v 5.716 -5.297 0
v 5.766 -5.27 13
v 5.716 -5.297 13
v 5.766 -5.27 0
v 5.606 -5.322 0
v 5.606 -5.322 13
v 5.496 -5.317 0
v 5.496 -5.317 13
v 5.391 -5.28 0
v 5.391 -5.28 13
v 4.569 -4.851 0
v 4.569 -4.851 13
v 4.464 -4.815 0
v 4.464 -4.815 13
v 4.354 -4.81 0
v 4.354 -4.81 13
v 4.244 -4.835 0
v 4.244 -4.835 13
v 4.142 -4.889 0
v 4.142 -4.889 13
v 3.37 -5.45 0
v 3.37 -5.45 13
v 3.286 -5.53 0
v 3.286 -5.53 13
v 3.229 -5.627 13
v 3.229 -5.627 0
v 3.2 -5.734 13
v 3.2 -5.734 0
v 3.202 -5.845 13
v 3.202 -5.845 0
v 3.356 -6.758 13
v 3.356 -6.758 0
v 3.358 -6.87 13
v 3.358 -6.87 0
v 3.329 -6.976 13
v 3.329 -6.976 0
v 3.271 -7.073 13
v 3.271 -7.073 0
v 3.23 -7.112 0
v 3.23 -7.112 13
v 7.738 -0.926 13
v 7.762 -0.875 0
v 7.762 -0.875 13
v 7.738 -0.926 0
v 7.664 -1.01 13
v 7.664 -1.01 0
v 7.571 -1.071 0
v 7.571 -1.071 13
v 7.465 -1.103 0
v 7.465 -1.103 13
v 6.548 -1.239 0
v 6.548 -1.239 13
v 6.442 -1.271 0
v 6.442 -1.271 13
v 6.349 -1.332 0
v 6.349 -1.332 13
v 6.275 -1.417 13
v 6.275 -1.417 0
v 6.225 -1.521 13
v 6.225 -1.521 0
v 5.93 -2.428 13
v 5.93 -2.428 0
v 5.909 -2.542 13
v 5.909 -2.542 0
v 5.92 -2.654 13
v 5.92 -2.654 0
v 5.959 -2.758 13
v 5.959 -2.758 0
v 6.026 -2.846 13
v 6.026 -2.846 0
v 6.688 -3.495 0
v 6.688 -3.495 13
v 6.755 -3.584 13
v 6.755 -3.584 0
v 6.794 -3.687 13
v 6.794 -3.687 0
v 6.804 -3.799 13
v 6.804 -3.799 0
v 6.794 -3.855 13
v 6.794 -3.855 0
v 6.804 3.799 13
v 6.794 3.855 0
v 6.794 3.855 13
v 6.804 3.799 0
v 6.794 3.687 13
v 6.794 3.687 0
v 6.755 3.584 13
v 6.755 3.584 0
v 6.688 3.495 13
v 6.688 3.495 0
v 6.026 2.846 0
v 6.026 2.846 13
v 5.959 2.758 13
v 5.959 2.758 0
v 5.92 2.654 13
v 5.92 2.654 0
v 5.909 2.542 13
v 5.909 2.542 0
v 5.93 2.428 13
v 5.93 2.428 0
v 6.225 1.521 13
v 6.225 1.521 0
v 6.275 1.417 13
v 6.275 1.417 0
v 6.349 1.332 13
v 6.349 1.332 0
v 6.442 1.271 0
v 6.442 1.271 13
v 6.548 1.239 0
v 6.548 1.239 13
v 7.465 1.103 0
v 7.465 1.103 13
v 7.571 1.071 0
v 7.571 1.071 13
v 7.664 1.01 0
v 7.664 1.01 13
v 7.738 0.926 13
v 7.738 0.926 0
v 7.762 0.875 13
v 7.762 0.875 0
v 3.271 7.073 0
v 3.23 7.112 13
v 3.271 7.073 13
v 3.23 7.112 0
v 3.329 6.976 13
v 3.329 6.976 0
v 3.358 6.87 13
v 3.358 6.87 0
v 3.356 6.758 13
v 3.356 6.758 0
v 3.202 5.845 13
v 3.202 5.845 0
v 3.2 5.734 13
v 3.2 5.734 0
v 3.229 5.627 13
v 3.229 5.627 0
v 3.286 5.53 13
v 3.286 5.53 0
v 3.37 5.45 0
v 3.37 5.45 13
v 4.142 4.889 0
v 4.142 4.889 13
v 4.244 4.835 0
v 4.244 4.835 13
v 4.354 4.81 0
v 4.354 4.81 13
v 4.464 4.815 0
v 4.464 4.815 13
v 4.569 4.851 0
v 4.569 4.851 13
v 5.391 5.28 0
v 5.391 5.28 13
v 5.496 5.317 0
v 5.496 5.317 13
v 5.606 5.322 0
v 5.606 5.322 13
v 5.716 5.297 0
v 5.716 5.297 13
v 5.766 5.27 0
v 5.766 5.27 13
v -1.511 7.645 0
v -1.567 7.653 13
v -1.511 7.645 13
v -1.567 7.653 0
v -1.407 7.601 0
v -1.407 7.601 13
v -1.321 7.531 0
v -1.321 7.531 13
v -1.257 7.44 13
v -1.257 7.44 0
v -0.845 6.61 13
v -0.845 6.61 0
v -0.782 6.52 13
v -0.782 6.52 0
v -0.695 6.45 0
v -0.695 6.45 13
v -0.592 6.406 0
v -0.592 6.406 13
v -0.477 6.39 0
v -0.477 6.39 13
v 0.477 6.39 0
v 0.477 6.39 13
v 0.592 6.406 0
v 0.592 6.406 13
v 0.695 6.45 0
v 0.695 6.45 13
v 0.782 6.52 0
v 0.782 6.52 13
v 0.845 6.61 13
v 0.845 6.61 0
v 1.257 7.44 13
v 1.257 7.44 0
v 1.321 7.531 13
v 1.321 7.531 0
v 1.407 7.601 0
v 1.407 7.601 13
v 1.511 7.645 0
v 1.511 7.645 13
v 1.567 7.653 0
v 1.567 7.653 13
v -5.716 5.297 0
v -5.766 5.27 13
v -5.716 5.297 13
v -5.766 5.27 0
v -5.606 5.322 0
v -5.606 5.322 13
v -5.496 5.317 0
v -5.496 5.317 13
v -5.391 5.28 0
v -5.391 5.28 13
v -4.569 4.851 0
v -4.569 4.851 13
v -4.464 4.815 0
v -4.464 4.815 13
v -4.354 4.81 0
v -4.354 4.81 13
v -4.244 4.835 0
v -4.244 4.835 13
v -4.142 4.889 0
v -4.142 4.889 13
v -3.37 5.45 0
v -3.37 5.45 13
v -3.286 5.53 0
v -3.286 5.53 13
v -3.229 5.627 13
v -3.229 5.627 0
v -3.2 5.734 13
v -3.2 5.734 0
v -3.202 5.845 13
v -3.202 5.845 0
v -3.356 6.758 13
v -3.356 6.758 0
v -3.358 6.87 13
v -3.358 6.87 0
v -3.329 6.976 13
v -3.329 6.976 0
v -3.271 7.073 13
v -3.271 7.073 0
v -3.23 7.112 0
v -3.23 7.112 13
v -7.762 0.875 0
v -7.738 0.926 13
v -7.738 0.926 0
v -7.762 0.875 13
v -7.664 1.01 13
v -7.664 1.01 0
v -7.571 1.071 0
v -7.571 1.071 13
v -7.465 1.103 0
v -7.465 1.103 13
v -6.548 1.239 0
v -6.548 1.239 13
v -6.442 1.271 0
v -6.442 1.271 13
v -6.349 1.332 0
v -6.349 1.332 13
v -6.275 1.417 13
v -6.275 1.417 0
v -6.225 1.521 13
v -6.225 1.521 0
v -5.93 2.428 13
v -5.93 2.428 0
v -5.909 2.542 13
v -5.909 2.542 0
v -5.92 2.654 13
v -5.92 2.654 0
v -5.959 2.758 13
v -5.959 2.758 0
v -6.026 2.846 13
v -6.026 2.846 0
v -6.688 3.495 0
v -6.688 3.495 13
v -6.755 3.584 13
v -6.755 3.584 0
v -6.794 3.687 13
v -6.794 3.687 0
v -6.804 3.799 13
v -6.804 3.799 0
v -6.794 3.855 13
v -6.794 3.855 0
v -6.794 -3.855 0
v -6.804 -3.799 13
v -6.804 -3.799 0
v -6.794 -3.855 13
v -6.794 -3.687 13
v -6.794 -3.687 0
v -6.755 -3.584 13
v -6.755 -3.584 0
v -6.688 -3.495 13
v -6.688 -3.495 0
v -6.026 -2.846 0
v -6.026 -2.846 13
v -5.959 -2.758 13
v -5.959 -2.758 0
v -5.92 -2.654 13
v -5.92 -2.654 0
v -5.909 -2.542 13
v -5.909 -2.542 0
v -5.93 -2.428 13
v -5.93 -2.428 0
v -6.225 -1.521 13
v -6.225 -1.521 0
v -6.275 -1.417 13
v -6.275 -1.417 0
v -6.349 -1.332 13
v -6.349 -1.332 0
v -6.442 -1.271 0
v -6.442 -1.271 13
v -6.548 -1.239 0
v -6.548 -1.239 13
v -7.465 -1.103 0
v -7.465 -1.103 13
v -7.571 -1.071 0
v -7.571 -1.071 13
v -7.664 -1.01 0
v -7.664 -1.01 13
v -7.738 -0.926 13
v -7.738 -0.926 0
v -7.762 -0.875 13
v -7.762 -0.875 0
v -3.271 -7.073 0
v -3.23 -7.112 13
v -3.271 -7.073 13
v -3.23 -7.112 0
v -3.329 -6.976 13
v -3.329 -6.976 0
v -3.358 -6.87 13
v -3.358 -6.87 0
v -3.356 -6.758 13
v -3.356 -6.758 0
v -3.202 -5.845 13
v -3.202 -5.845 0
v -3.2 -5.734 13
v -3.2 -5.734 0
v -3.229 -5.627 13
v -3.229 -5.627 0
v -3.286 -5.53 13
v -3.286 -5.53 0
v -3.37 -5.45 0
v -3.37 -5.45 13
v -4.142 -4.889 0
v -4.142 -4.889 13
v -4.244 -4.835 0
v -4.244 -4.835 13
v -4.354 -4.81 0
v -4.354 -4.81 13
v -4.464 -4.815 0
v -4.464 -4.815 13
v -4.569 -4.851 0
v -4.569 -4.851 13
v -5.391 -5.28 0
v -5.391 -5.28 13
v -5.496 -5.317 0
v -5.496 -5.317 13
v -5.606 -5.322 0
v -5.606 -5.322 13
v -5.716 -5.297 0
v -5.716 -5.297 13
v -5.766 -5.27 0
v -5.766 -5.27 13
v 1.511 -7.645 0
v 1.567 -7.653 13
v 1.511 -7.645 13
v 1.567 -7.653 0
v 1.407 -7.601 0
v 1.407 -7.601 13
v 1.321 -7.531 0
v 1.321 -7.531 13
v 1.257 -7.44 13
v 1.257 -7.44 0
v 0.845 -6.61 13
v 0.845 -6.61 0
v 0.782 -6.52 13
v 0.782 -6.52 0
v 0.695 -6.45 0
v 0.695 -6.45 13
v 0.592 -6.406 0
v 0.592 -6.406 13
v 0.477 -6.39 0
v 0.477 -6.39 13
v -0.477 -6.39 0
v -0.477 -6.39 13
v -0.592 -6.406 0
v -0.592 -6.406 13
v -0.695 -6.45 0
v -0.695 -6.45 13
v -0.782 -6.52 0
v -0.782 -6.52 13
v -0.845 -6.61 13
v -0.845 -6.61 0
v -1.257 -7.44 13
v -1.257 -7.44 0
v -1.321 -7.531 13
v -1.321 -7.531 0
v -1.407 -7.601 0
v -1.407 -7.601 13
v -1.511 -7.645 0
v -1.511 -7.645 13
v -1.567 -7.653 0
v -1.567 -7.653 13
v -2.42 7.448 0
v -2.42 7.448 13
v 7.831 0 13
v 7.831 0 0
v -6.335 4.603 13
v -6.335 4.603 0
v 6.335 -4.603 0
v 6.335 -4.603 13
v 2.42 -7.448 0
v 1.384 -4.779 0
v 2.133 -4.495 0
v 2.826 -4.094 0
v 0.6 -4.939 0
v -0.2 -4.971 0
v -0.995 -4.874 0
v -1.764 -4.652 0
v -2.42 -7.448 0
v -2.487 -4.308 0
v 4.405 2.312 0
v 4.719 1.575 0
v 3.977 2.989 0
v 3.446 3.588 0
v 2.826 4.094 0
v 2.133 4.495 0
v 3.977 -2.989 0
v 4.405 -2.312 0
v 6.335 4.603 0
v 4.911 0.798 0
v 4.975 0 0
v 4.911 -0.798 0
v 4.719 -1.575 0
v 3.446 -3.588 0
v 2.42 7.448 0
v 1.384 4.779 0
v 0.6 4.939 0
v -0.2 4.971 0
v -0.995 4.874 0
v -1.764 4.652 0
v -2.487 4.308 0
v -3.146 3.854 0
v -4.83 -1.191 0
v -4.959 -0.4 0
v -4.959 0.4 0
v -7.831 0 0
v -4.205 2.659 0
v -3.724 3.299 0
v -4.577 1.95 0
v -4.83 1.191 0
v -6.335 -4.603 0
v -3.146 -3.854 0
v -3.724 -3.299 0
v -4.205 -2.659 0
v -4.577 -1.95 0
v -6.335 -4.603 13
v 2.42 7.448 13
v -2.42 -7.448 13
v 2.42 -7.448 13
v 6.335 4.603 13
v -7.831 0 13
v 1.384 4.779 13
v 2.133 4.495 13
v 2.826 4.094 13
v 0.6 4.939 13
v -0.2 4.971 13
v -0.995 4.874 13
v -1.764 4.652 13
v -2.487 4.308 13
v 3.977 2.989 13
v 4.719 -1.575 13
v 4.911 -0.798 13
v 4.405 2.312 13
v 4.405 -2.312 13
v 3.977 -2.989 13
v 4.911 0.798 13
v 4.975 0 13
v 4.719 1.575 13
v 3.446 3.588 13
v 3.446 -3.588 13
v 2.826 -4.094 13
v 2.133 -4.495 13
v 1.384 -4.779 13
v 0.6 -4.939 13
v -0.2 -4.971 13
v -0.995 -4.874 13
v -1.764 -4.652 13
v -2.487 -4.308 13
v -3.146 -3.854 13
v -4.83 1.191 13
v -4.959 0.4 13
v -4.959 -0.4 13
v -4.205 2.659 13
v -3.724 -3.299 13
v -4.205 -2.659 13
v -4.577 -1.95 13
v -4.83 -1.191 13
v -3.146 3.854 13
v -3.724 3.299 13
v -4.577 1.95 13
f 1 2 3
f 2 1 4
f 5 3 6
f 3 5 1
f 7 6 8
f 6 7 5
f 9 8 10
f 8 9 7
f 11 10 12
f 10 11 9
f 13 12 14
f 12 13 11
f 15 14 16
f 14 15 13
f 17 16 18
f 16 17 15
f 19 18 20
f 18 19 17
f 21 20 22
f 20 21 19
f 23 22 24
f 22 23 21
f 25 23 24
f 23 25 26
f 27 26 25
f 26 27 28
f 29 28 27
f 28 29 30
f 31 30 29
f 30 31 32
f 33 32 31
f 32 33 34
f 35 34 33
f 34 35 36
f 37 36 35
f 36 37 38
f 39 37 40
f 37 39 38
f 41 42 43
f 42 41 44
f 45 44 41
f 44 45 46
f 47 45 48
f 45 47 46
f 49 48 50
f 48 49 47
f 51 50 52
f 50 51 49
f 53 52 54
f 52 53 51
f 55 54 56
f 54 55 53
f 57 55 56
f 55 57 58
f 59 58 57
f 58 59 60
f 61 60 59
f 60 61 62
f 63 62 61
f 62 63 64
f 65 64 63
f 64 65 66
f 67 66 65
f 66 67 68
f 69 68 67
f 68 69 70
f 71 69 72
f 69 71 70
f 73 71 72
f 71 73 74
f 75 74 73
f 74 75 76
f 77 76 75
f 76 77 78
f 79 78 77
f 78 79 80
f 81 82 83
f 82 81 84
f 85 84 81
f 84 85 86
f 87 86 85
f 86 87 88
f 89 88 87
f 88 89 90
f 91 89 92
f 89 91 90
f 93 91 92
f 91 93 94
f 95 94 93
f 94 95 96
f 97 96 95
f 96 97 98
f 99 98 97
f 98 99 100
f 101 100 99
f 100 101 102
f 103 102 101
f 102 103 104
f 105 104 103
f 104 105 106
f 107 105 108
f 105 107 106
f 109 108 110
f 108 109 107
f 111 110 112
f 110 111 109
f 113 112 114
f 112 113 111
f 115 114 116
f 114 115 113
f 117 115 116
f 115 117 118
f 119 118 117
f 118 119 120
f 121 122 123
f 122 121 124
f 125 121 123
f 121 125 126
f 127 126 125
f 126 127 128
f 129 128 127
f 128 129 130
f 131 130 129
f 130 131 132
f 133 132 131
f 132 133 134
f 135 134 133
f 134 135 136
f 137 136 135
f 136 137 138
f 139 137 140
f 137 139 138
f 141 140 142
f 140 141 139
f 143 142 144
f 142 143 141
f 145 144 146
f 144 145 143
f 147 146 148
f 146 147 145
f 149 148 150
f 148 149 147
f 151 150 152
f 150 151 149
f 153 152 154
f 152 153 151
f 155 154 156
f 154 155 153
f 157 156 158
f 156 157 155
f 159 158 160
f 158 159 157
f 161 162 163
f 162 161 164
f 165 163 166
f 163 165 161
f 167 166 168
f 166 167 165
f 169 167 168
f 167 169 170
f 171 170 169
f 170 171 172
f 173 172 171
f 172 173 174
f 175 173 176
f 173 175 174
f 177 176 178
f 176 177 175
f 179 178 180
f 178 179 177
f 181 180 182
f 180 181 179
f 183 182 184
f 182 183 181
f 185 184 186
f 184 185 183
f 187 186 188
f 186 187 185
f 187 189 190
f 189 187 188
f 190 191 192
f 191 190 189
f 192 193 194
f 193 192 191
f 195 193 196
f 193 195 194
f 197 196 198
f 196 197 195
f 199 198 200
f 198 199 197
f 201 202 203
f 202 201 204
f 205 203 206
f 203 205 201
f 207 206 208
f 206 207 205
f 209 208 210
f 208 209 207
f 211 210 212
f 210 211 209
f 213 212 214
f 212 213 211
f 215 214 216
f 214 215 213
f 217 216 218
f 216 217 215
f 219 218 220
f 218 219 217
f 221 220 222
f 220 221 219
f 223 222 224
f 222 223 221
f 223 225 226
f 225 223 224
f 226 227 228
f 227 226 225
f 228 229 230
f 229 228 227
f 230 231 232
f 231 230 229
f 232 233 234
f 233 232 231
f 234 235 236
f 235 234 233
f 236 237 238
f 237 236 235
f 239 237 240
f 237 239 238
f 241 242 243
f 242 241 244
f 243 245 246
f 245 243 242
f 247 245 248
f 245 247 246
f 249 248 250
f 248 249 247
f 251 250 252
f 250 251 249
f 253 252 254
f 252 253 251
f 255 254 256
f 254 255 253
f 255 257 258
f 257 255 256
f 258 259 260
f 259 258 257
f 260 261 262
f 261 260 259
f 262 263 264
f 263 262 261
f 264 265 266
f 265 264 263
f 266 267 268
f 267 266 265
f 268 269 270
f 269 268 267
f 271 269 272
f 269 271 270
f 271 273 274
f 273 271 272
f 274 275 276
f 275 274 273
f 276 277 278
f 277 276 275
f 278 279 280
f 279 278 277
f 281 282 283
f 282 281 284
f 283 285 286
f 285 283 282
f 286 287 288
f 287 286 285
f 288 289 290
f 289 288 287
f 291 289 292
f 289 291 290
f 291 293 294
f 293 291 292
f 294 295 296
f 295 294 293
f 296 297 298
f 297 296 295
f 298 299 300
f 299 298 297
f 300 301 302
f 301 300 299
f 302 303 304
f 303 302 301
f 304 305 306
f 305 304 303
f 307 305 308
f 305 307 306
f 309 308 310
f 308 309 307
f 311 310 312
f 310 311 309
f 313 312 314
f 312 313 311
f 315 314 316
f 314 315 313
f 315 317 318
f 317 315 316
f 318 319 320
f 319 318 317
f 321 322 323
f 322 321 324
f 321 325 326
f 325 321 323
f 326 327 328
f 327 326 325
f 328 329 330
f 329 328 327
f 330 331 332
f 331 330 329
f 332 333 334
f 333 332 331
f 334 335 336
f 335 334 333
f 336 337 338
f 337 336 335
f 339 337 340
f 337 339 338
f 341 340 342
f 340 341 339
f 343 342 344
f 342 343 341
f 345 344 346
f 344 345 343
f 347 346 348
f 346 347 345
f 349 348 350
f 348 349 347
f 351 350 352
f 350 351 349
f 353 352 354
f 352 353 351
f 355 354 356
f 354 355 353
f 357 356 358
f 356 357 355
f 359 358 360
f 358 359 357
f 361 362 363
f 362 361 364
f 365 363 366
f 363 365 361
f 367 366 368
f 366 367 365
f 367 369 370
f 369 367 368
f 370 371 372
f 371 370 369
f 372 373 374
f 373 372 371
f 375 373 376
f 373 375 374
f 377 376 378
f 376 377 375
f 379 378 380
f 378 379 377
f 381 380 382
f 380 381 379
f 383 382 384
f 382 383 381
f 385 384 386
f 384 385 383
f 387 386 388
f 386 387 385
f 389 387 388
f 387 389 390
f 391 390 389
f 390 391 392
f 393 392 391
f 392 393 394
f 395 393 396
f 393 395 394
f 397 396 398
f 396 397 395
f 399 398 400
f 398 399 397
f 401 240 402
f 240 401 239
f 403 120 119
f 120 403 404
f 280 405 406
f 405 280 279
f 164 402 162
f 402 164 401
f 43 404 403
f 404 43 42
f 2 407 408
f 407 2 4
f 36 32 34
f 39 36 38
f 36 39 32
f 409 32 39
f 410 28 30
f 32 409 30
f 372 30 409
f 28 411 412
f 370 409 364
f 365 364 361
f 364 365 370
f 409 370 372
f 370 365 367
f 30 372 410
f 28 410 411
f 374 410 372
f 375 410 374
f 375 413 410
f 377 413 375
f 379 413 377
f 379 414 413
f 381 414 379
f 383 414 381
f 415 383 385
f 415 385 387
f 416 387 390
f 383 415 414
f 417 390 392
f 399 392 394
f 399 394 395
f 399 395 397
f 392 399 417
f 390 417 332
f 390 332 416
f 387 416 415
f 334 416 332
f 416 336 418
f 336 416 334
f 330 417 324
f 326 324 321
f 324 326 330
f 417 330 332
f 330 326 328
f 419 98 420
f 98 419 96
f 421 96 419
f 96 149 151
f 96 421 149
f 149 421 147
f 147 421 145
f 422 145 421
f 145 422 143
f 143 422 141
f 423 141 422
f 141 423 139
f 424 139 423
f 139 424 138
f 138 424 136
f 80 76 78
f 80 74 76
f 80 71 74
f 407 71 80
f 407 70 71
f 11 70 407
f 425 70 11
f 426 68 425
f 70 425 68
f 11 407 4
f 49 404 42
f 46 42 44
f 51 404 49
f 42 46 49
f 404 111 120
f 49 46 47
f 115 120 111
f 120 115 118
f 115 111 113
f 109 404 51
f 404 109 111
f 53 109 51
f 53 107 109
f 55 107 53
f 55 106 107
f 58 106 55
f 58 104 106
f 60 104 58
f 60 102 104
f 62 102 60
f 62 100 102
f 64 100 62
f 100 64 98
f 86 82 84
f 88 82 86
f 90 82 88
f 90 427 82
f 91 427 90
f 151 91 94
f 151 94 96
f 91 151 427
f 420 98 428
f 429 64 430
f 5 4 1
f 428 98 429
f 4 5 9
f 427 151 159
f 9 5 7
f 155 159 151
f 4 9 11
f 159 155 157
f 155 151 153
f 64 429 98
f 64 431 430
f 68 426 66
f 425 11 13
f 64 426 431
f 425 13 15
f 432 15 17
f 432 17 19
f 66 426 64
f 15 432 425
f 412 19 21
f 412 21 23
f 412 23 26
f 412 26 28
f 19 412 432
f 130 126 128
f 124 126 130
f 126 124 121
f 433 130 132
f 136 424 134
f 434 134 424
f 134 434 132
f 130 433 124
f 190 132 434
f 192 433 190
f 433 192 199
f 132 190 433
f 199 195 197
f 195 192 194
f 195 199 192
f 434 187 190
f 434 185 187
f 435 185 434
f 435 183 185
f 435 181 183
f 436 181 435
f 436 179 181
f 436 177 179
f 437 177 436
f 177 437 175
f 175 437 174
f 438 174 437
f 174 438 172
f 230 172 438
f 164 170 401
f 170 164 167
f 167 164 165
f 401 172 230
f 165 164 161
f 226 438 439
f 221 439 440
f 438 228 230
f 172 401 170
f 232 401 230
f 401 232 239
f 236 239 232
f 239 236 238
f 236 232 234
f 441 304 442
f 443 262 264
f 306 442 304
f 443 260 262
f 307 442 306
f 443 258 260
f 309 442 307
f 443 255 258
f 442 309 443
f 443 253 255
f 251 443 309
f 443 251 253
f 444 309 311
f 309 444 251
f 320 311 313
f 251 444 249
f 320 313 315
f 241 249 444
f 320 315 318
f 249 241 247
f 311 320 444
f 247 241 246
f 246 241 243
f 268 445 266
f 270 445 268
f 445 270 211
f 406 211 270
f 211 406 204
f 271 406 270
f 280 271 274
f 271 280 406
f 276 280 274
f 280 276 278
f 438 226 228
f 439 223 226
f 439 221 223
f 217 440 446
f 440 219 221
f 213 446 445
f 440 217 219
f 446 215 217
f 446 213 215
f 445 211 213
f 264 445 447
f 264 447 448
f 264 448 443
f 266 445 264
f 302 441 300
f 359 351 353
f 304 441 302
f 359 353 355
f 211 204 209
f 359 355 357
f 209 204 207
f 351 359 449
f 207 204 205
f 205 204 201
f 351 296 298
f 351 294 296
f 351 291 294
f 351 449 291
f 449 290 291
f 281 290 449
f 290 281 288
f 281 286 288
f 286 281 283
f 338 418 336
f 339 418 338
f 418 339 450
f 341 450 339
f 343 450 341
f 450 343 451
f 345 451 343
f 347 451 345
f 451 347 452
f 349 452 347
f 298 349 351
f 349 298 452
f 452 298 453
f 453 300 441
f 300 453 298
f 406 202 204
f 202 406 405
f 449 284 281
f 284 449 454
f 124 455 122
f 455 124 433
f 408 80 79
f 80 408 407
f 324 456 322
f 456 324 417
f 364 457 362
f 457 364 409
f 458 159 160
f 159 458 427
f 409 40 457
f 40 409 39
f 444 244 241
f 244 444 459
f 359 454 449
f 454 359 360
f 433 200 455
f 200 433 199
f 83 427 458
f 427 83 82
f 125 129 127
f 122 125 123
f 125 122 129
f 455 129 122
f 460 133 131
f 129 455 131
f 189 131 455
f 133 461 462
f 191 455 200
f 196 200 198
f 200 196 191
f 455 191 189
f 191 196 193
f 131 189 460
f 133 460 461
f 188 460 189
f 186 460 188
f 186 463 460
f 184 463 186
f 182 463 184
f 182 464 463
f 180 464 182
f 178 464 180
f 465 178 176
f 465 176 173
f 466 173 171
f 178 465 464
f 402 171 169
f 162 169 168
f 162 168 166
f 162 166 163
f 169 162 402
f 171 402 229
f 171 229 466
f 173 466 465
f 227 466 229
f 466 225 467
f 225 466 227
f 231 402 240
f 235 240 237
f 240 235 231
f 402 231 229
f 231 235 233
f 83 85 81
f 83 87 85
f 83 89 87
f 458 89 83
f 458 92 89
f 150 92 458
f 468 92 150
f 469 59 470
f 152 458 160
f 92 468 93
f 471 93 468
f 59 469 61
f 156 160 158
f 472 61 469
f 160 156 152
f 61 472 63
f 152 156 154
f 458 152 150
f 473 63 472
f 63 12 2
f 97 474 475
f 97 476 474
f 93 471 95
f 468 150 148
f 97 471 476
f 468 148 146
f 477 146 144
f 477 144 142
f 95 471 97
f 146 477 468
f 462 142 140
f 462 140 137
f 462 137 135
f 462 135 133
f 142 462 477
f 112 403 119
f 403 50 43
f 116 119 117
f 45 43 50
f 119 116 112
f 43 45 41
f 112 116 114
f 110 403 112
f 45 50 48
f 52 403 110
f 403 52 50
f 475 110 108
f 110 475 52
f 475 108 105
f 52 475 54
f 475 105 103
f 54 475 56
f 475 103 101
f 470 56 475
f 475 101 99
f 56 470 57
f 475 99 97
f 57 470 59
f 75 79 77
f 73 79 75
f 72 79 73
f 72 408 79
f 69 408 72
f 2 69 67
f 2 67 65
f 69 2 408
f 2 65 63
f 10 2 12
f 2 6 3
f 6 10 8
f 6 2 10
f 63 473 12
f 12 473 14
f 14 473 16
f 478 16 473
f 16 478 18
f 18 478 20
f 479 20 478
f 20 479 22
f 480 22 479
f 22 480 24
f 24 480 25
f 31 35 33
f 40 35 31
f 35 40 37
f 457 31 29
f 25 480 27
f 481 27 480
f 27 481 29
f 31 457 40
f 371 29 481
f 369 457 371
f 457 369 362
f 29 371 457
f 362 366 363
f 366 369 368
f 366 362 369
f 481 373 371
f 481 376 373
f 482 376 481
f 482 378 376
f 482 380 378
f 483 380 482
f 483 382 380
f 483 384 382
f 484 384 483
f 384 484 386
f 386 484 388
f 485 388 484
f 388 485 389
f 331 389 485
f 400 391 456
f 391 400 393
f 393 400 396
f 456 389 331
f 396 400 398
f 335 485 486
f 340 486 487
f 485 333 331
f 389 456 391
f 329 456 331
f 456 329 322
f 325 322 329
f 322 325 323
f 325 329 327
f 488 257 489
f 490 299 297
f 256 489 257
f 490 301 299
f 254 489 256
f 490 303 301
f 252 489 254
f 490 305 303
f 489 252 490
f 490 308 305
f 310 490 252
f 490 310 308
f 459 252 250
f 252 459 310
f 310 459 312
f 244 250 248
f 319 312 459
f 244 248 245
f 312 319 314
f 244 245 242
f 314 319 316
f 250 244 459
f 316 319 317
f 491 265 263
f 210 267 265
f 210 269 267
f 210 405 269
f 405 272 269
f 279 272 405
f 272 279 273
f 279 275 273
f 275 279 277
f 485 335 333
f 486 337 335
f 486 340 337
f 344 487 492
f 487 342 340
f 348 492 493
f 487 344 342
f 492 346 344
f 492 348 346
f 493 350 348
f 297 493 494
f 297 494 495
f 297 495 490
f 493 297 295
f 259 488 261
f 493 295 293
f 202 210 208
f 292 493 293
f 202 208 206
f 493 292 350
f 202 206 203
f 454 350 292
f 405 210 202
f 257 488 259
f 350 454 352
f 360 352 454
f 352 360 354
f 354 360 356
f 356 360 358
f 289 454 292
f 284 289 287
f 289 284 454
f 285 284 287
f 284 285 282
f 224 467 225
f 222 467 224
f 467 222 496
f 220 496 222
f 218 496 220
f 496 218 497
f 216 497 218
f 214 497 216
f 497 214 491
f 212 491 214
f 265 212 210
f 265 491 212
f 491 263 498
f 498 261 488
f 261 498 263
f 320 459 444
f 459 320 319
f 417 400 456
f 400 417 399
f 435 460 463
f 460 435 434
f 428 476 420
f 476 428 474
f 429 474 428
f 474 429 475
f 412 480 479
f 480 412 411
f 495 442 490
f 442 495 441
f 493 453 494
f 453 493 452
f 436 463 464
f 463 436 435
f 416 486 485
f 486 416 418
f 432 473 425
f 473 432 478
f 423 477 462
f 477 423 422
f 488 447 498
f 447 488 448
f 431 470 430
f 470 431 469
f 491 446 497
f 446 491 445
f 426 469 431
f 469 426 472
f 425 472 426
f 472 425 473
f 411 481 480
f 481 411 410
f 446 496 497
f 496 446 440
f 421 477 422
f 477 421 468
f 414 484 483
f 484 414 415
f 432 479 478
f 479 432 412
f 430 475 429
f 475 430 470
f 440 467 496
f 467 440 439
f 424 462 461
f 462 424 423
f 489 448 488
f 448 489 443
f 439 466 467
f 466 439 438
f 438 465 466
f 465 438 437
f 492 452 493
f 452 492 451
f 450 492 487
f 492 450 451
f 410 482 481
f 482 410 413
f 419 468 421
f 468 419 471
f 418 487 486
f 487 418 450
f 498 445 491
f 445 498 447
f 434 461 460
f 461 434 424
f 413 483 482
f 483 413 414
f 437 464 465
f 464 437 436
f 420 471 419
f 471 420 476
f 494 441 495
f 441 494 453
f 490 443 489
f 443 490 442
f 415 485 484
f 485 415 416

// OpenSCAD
// Parametric Pulley with multiple belt profiles
// by droftarts January 2012

// Based on pulleys by:
// http://www.thingiverse.com/thing:11256 by me!
// https://github.com/prusajr/PrusaMendel by Josef Prusa
// http://www.thingiverse.com/thing:3104 by GilesBathgate
// http://www.thingiverse.com/thing:2079 by nophead

// dxf tooth data from http://oem.cadregister.com/asp/PPOW_Entry.asp?company=915217&elementID=07807803/METRIC/URETH/WV0025/F
// pulley diameter checked and modelled from data at http://www.sdp-si.com/D265/HTML/D265T016.html

/**
 * @name Pulley
 * @category Printed
 * @using 1 x m3 nut, normal or nyloc
 * @using 1 x m3x10 set screw or 1 x m3x8 grub screw
 */


// tuneable constants

teeth = 10;			// Number of teeth, standard Mendel T5 belt = 8, gives Outside Diameter of 11.88mm
profile = 3;		// 1=MXL 2=40DP 3=XL 4=H 5=T2.5 6=T5 7=T10 8=AT5 9=HTD_3mm 10=HTD_5mm 11=HTD_8mm 12=GT2_2mm 13=GT2_3mm 14=GT2_5mm

motor_shaft = 9.95;	// NEMA17 motor shaft exact diameter = 5
m3_dia = 3.2;		// 3mm hole diameter
m3_nut_hex = 1;		// 1 for hex, 0 for square nut
m3_nut_flats = 5.7;	// normal M3 hex nut exact width = 5.5
m3_nut_depth = 2.7;	// normal M3 hex nut exact depth = 2.4, nyloc = 4

retainer = 0;		// Belt retainer above teeth, 0 = No, 1 = Yes
retainer_ht = 0;	// height of retainer flange over pulley, standard = 1.5
idler = 0;			// Belt retainer below teeth, 0 = No, 1 = Yes
idler_ht = 0;		// height of idler flange over pulley, standard = 1.5

pulley_t_ht = 13;	// length of toothed part of pulley, standard = 12
pulley_b_ht = 0;		// pulley base height, standard = 8. Set to same as idler_ht if you want an idler but no pulley.
pulley_b_dia = 20;	// pulley base diameter, standard = 20
no_of_nuts = 1;		// number of captive nuts required, standard = 1
nut_angle = 90;		// angle between nuts, standard = 90
nut_shaft_distance = 1.2;	// distance between inner face of nut and shaft, can be negative.


//	********************************
//	** Scaling tooth for good fit **
//	********************************
/*	To improve fit of belt to pulley, set the following constant. Decrease or increase by 0.1mm at a time. We are modelling the *BELT* tooth here, not the tooth on the pulley. Increasing the number will *decrease* the pulley tooth size. Increasing the tooth width will also scale proportionately the tooth depth, to maintain the shape of the tooth, and increase how far into the pulley the tooth is indented. Can be negative */

additional_tooth_width = 0.2; //mm

//	If you need more tooth depth than this provides, adjust the following constant. However, this will cause the shape of the tooth to change.

additional_tooth_depth = 0; //mm

// calculated constants

nut_elevation = pulley_b_ht/2;
m3_nut_points = 2*((m3_nut_flats/2)/cos(30)); // This is needed for the nut trap

// The following set the pulley diameter for a given number of teeth

MXL_pulley_dia = tooth_spacing (2.032,0.254);
40DP_pulley_dia = tooth_spacing (2.07264,0.1778);
XL_pulley_dia = tooth_spacing (5.08,0.254);
H_pulley_dia = tooth_spacing (9.525,0.381);
T2_5_pulley_dia = tooth_spaceing_curvefit (0.7467,0.796,1.026);
T5_pulley_dia = tooth_spaceing_curvefit (0.6523,1.591,1.064);
T10_pulley_dia = tooth_spacing (10,0.93);
AT5_pulley_dia = tooth_spaceing_curvefit (0.6523,1.591,1.064);
HTD_3mm_pulley_dia = tooth_spacing (3,0.381);
HTD_5mm_pulley_dia = tooth_spacing (5,0.5715);
HTD_8mm_pulley_dia = tooth_spacing (8,0.6858);
GT2_2mm_pulley_dia = tooth_spacing (2,0.254);
GT2_3mm_pulley_dia = tooth_spacing (3,0.381);
GT2_5mm_pulley_dia = tooth_spacing (5,0.5715);

// The following calls the pulley creation part, and passes the pulley diameter and tooth width to that module

if ( profile == 1 ) { pulley ( "MXL" , MXL_pulley_dia , 0.508 , 1.321 ); }
if ( profile == 2 ) { pulley ( "40 D.P." , 40DP_pulley_dia , 0.457 , 1.226 ); }
if ( profile == 3 ) { pulley ( "XL" , XL_pulley_dia , 1.27, 3.051 ); }
if ( profile == 4 ) { pulley ( "H" , H_pulley_dia ,1.905 , 5.359 ); }
if ( profile == 5 ) { pulley ( "T2.5" , T2_5_pulley_dia , 0.7 , 1.678 ); }
if ( profile == 6 ) { pulley ( "T5" , T5_pulley_dia , 1.19 , 3.264 ); }
if ( profile == 7 ) { pulley ( "T10" , T10_pulley_dia , 2.5 , 6.13 ); }
if ( profile == 8 ) { pulley ( "AT5" , AT5_pulley_dia , 1.19 , 4.268 ); }
if ( profile == 9 ) { pulley ( "HTD 3mm" , HTD_3mm_pulley_dia , 1.289 , 2.27 ); }
if ( profile == 10 ) { pulley ( "HTD 5mm" , HTD_5mm_pulley_dia , 2.199 , 3.781 ); }
if ( profile == 11 ) { pulley ( "HTD 8mm" , HTD_8mm_pulley_dia , 3.607 , 6.603 ); }
if ( profile == 12 ) { pulley ( "GT2 2mm" , GT2_2mm_pulley_dia , 0.764 , 1.494 ); }
if ( profile == 13 ) { pulley ( "GT2 3mm" , GT2_3mm_pulley_dia , 1.169 , 2.31 ); }
if ( profile == 14 ) { pulley ( "GT2 5mm" , GT2_5mm_pulley_dia , 1.969 , 3.952 ); }

// Functions

function tooth_spaceing_curvefit (b,c,d)
	= ((c * pow(teeth,d)) / (b + pow(teeth,d))) * teeth ;

function tooth_spacing(tooth_pitch,pitch_line_offset)
	= (2*((teeth*tooth_pitch)/(3.14159265*2)-pitch_line_offset)) ;

// Main Module

module pulley( belt_type , pulley_OD , tooth_depth , tooth_width )
	{
	echo (str("Belt type = ",belt_type,"; Number of teeth = ",teeth,"; Pulley Outside Diameter = ",pulley_OD,"mm "));
	tooth_distance_from_centre = sqrt( pow(pulley_OD/2,2) - pow((tooth_width+additional_tooth_width)/2,2));
	tooth_width_scale = (tooth_width + additional_tooth_width ) / tooth_width;
	tooth_depth_scale = ((tooth_depth + additional_tooth_depth ) / tooth_depth) ;


//	************************************************************************
//	*** uncomment the following line if pulley is wider than puller base ***
//	************************************************************************

//	translate ([0,0, pulley_b_ht + pulley_t_ht + retainer_ht ]) rotate ([0,180,0])

	difference()
	 {	 
		union()
		{
			//base
	
			if ( pulley_b_ht < 2 ) { echo ("CAN'T DRAW PULLEY BASE, HEIGHT LESS THAN 2!!!"); } else {
				rotate_extrude($fn=pulley_b_dia*2)
				{
						square([pulley_b_dia/2-1,pulley_b_ht]);
						square([pulley_b_dia/2,pulley_b_ht-1]);
						translate([pulley_b_dia/2-1,pulley_b_ht-1]) circle(1);
				}
			}
	
		difference()
			{
			//shaft - diameter is outside diameter of pulley
			
			translate([0,0,pulley_b_ht]) 
			rotate ([0,0,360/(teeth*4)]) 
			cylinder(r=pulley_OD/2,h=pulley_t_ht, $fn=teeth*4);
	
			//teeth - cut out of shaft
		
			for(i=[1:teeth]) 
			rotate([0,0,i*(360/teeth)])
			translate([0,-tooth_distance_from_centre,pulley_b_ht -1]) 
			scale ([ tooth_width_scale , tooth_depth_scale , 1 ]) 
			{
			if ( profile == 1 ) { MXL();}
			if ( profile == 2 ) { 40DP();}
			if ( profile == 3 ) { XL();}
			if ( profile == 4 ) { H();}
			if ( profile == 5 ) { T2_5();}
			if ( profile == 6 ) { T5();}
			if ( profile == 7 ) { T10();}
			if ( profile == 8 ) { AT5();}
			if ( profile == 9 ) { HTD_3mm();}
			if ( profile == 10 ) { HTD_5mm();}
			if ( profile == 11 ) { HTD_8mm();}
			if ( profile == 12 ) { GT2_2mm();}
			if ( profile == 13 ) { GT2_3mm();}
			if ( profile == 14 ) { GT2_5mm();}
			}

			}
			
		//belt retainer / idler
		if ( retainer > 0 ) {translate ([0,0, pulley_b_ht + pulley_t_ht ]) 
		rotate_extrude($fn=teeth*4)  
		polygon([[0,0],[pulley_OD/2,0],[pulley_OD/2 + retainer_ht , retainer_ht],[0 , retainer_ht],[0,0]]);}
		
		if ( idler > 0 ) {translate ([0,0, pulley_b_ht - idler_ht ]) 
		rotate_extrude($fn=teeth*4)  
		polygon([[0,0],[pulley_OD/2 + idler_ht,0],[pulley_OD/2 , idler_ht],[0 , idler_ht],[0,0]]);}
	
		}
	   
		//hole for motor shaft
		translate([0,0,-1])cylinder(r=motor_shaft/2,h=pulley_b_ht + pulley_t_ht + retainer_ht + 2,$fn=motor_shaft*4);
				
		//captive nut and grub screw holes
	
		if ( pulley_b_ht < m3_nut_flats ) { echo ("CAN'T DRAW CAPTIVE NUTS, HEIGHT LESS THAN NUT DIAMETER!!!"); } else {
		if ( (pulley_b_dia - motor_shaft)/2 < m3_nut_depth + 3 ) { echo ("CAN'T DRAW CAPTIVE NUTS, DIAMETER TOO SMALL FOR NUT DEPTH!!!"); } else {
	
			for(j=[1:no_of_nuts]) rotate([0,0,j*nut_angle])
			translate([0,0,nut_elevation])rotate([90,0,0])
	
			union()
			{
				//entrance
				translate([0,-pulley_b_ht/4-0.5,motor_shaft/2+m3_nut_depth/2+nut_shaft_distance]) cube([m3_nut_flats,pulley_b_ht/2+1,m3_nut_depth],center=true);
	
				//nut
				if ( m3_nut_hex > 0 )
					{
						// hex nut
						translate([0,0.25,motor_shaft/2+m3_nut_depth/2+nut_shaft_distance]) rotate([0,0,30]) cylinder(r=m3_nut_points/2,h=m3_nut_depth,center=true,$fn=6);
					} else {
						// square nut
						translate([0,0.25,motor_shaft/2+m3_nut_depth/2+nut_shaft_distance]) cube([m3_nut_flats,m3_nut_flats,m3_nut_depth],center=true);
					}
	
				//grub screw hole
				rotate([0,0,22.5])cylinder(r=m3_dia/2,h=pulley_b_dia/2+1,$fn=8);
			}
		}}
	 }
	   
	}


// Tooth profile modules

module MXL()
	{
	linear_extrude(height=pulley_t_ht+2) polygon([[-0.660421,-0.5],[-0.660421,0],[-0.621898,0.006033],[-0.587714,0.023037],[-0.560056,0.049424],[-0.541182,0.083609],[-0.417357,0.424392],[-0.398413,0.458752],[-0.370649,0.48514],[-0.336324,0.502074],[-0.297744,0.508035],[0.297744,0.508035],[0.336268,0.502074],[0.370452,0.48514],[0.39811,0.458752],[0.416983,0.424392],[0.540808,0.083609],[0.559752,0.049424],[0.587516,0.023037],[0.621841,0.006033],[0.660421,0],[0.660421,-0.5]]);
	}

module 40DP()
	{
	linear_extrude(height=pulley_t_ht+2) polygon([[-0.612775,-0.5],[-0.612775,0],[-0.574719,0.010187],[-0.546453,0.0381],[-0.355953,0.3683],[-0.327604,0.405408],[-0.291086,0.433388],[-0.248548,0.451049],[-0.202142,0.4572],[0.202494,0.4572],[0.248653,0.451049],[0.291042,0.433388],[0.327609,0.405408],[0.356306,0.3683],[0.546806,0.0381],[0.574499,0.010187],[0.612775,0],[0.612775,-0.5]]);
	}

module XL()
	{
	linear_extrude(height=pulley_t_ht+2) polygon([[-1.525411,-1],[-1.525411,0],[-1.41777,0.015495],[-1.320712,0.059664],[-1.239661,0.129034],[-1.180042,0.220133],[-0.793044,1.050219],[-0.733574,1.141021],[-0.652507,1.210425],[-0.555366,1.254759],[-0.447675,1.270353],[0.447675,1.270353],[0.555366,1.254759],[0.652507,1.210425],[0.733574,1.141021],[0.793044,1.050219],[1.180042,0.220133],[1.239711,0.129034],[1.320844,0.059664],[1.417919,0.015495],[1.525411,0],[1.525411,-1]]);
	}

module H()
	{
	linear_extrude(height=pulley_t_ht+2) polygon([[-2.6797,-1],[-2.6797,0],[-2.600907,0.006138],[-2.525342,0.024024],[-2.45412,0.052881],[-2.388351,0.091909],[-2.329145,0.140328],[-2.277614,0.197358],[-2.234875,0.262205],[-2.202032,0.334091],[-1.75224,1.57093],[-1.719538,1.642815],[-1.676883,1.707663],[-1.62542,1.764693],[-1.566256,1.813112],[-1.500512,1.85214],[-1.4293,1.880997],[-1.353742,1.898883],[-1.274949,1.905021],[1.275281,1.905021],[1.354056,1.898883],[1.429576,1.880997],[1.500731,1.85214],[1.566411,1.813112],[1.625508,1.764693],[1.676919,1.707663],[1.719531,1.642815],[1.752233,1.57093],[2.20273,0.334091],[2.235433,0.262205],[2.278045,0.197358],[2.329455,0.140328],[2.388553,0.091909],[2.454233,0.052881],[2.525384,0.024024],[2.600904,0.006138],[2.6797,0],[2.6797,-1]]);
	}

module T2_5()
	{
	linear_extrude(height=pulley_t_ht+2) polygon([[-0.839258,-0.5],[-0.839258,0],[-0.770246,0.021652],[-0.726369,0.079022],[-0.529167,0.620889],[-0.485025,0.67826],[-0.416278,0.699911],[0.416278,0.699911],[0.484849,0.67826],[0.528814,0.620889],[0.726369,0.079022],[0.770114,0.021652],[0.839258,0],[0.839258,-0.5]]);
	}

module T5()
	{
	linear_extrude(height=pulley_t_ht+2) polygon([[-1.632126,-0.5],[-1.632126,0],[-1.568549,0.004939],[-1.507539,0.019367],[-1.450023,0.042686],[-1.396912,0.074224],[-1.349125,0.113379],[-1.307581,0.159508],[-1.273186,0.211991],[-1.246868,0.270192],[-1.009802,0.920362],[-0.983414,0.978433],[-0.949018,1.030788],[-0.907524,1.076798],[-0.859829,1.115847],[-0.80682,1.147314],[-0.749402,1.170562],[-0.688471,1.184956],[-0.624921,1.189895],[0.624971,1.189895],[0.688622,1.184956],[0.749607,1.170562],[0.807043,1.147314],[0.860055,1.115847],[0.907754,1.076798],[0.949269,1.030788],[0.9837,0.978433],[1.010193,0.920362],[1.246907,0.270192],[1.273295,0.211991],[1.307726,0.159508],[1.349276,0.113379],[1.397039,0.074224],[1.450111,0.042686],[1.507589,0.019367],[1.568563,0.004939],[1.632126,0],[1.632126,-0.5]]);
	}

module T10()
	{
	linear_extrude(height=pulley_t_ht+2) polygon([[-3.06511,-1],[-3.06511,0],[-2.971998,0.007239],[-2.882718,0.028344],[-2.79859,0.062396],[-2.720931,0.108479],[-2.651061,0.165675],[-2.590298,0.233065],[-2.539962,0.309732],[-2.501371,0.394759],[-1.879071,2.105025],[-1.840363,2.190052],[-1.789939,2.266719],[-1.729114,2.334109],[-1.659202,2.391304],[-1.581518,2.437387],[-1.497376,2.47144],[-1.408092,2.492545],[-1.314979,2.499784],[1.314979,2.499784],[1.408091,2.492545],[1.497371,2.47144],[1.581499,2.437387],[1.659158,2.391304],[1.729028,2.334109],[1.789791,2.266719],[1.840127,2.190052],[1.878718,2.105025],[2.501018,0.394759],[2.539726,0.309732],[2.59015,0.233065],[2.650975,0.165675],[2.720887,0.108479],[2.798571,0.062396],[2.882713,0.028344],[2.971997,0.007239],[3.06511,0],[3.06511,-1]]);
	}

module AT5()
	{
	linear_extrude(height=pulley_t_ht+2) polygon([[-2.134129,-0.75],[-2.134129,0],[-2.058023,0.005488],[-1.984595,0.021547],[-1.914806,0.047569],[-1.849614,0.082947],[-1.789978,0.127073],[-1.736857,0.179338],[-1.691211,0.239136],[-1.653999,0.305859],[-1.349199,0.959203],[-1.286933,1.054635],[-1.201914,1.127346],[-1.099961,1.173664],[-0.986896,1.18992],[0.986543,1.18992],[1.099614,1.173664],[1.201605,1.127346],[1.286729,1.054635],[1.349199,0.959203],[1.653646,0.305859],[1.690859,0.239136],[1.73651,0.179338],[1.789644,0.127073],[1.849305,0.082947],[1.914539,0.047569],[1.984392,0.021547],[2.057906,0.005488],[2.134129,0],[2.134129,-0.75]]);
	}

module HTD_3mm()
	{
	linear_extrude(height=pulley_t_ht+2) polygon([[-1.135062,-0.5],[-1.135062,0],[-1.048323,0.015484],[-0.974284,0.058517],[-0.919162,0.123974],[-0.889176,0.206728],[-0.81721,0.579614],[-0.800806,0.653232],[-0.778384,0.72416],[-0.750244,0.792137],[-0.716685,0.856903],[-0.678005,0.918199],[-0.634505,0.975764],[-0.586483,1.029338],[-0.534238,1.078662],[-0.47807,1.123476],[-0.418278,1.16352],[-0.355162,1.198533],[-0.289019,1.228257],[-0.22015,1.25243],[-0.148854,1.270793],[-0.07543,1.283087],[-0.000176,1.28905],[0.075081,1.283145],[0.148515,1.270895],[0.219827,1.252561],[0.288716,1.228406],[0.354879,1.19869],[0.418018,1.163675],[0.477831,1.123623],[0.534017,1.078795],[0.586276,1.029452],[0.634307,0.975857],[0.677809,0.91827],[0.716481,0.856953],[0.750022,0.792167],[0.778133,0.724174],[0.800511,0.653236],[0.816857,0.579614],[0.888471,0.206728],[0.919014,0.123974],[0.974328,0.058517],[1.048362,0.015484],[1.135062,0],[1.135062,-0.5]]);
	}

module HTD_5mm()
	{
	linear_extrude(height=pulley_t_ht+2) polygon([[-1.89036,-0.75],[-1.89036,0],[-1.741168,0.02669],[-1.61387,0.100806],[-1.518984,0.21342],[-1.467026,0.3556],[-1.427162,0.960967],[-1.398568,1.089602],[-1.359437,1.213531],[-1.310296,1.332296],[-1.251672,1.445441],[-1.184092,1.552509],[-1.108081,1.653042],[-1.024167,1.746585],[-0.932877,1.832681],[-0.834736,1.910872],[-0.730271,1.980701],[-0.62001,2.041713],[-0.504478,2.09345],[-0.384202,2.135455],[-0.259708,2.167271],[-0.131524,2.188443],[-0.000176,2.198511],[0.131296,2.188504],[0.259588,2.167387],[0.384174,2.135616],[0.504527,2.093648],[0.620123,2.04194],[0.730433,1.980949],[0.834934,1.911132],[0.933097,1.832945],[1.024398,1.746846],[1.108311,1.653291],[1.184308,1.552736],[1.251865,1.445639],[1.310455,1.332457],[1.359552,1.213647],[1.39863,1.089664],[1.427162,0.960967],[1.467026,0.3556],[1.518984,0.21342],[1.61387,0.100806],[1.741168,0.02669],[1.89036,0],[1.89036,-0.75]]);
	}

module HTD_8mm()
	{
	linear_extrude(height=pulley_t_ht+2) polygon([[-3.301471,-1],[-3.301471,0],[-3.16611,0.012093],[-3.038062,0.047068],[-2.919646,0.10297],[-2.813182,0.177844],[-2.720989,0.269734],[-2.645387,0.376684],[-2.588694,0.496739],[-2.553229,0.627944],[-2.460801,1.470025],[-2.411413,1.691917],[-2.343887,1.905691],[-2.259126,2.110563],[-2.158035,2.30575],[-2.041518,2.490467],[-1.910478,2.66393],[-1.76582,2.825356],[-1.608446,2.973961],[-1.439261,3.10896],[-1.259169,3.22957],[-1.069074,3.335006],[-0.869878,3.424485],[-0.662487,3.497224],[-0.447804,3.552437],[-0.226732,3.589341],[-0.000176,3.607153],[0.226511,3.589461],[0.447712,3.552654],[0.66252,3.497516],[0.870027,3.424833],[1.069329,3.33539],[1.259517,3.229973],[1.439687,3.109367],[1.608931,2.974358],[1.766344,2.825731],[1.911018,2.664271],[2.042047,2.490765],[2.158526,2.305998],[2.259547,2.110755],[2.344204,1.905821],[2.411591,1.691983],[2.460801,1.470025],[2.553229,0.627944],[2.588592,0.496739],[2.645238,0.376684],[2.720834,0.269734],[2.81305,0.177844],[2.919553,0.10297],[3.038012,0.047068],[3.166095,0.012093],[3.301471,0],[3.301471,-1]]);
	}

module GT2_2mm()
	{
	linear_extrude(height=pulley_t_ht+2) polygon([[0.747183,-0.5],[0.747183,0],[0.647876,0.037218],[0.598311,0.130528],[0.578556,0.238423],[0.547158,0.343077],[0.504649,0.443762],[0.451556,0.53975],[0.358229,0.636924],[0.2484,0.707276],[0.127259,0.750044],[0,0.76447],[-0.127259,0.750044],[-0.2484,0.707276],[-0.358229,0.636924],[-0.451556,0.53975],[-0.504797,0.443762],[-0.547291,0.343077],[-0.578605,0.238423],[-0.598311,0.130528],[-0.648009,0.037218],[-0.747183,0],[-0.747183,-0.5]]);
	}

module GT2_3mm()
	{
	linear_extrude(height=pulley_t_ht+2) polygon([[-1.155171,-0.5],[-1.155171,0],[-1.065317,0.016448],[-0.989057,0.062001],[-0.93297,0.130969],[-0.90364,0.217664],[-0.863705,0.408181],[-0.800056,0.591388],[-0.713587,0.765004],[-0.60519,0.926747],[-0.469751,1.032548],[-0.320719,1.108119],[-0.162625,1.153462],[0,1.168577],[0.162625,1.153462],[0.320719,1.108119],[0.469751,1.032548],[0.60519,0.926747],[0.713587,0.765004],[0.800056,0.591388],[0.863705,0.408181],[0.90364,0.217664],[0.932921,0.130969],[0.988924,0.062001],[1.065168,0.016448],[1.155171,0],[1.155171,-0.5]]);
	}

module GT2_5mm()
	{
	linear_extrude(height=pulley_t_ht+2) polygon([[-1.975908,-0.75],[-1.975908,0],[-1.797959,0.03212],[-1.646634,0.121224],[-1.534534,0.256431],[-1.474258,0.426861],[-1.446911,0.570808],[-1.411774,0.712722],[-1.368964,0.852287],[-1.318597,0.989189],[-1.260788,1.123115],[-1.195654,1.25375],[-1.12331,1.380781],[-1.043869,1.503892],[-0.935264,1.612278],[-0.817959,1.706414],[-0.693181,1.786237],[-0.562151,1.851687],[-0.426095,1.9027],[-0.286235,1.939214],[-0.143795,1.961168],[0,1.9685],[0.143796,1.961168],[0.286235,1.939214],[0.426095,1.9027],[0.562151,1.851687],[0.693181,1.786237],[0.817959,1.706414],[0.935263,1.612278],[1.043869,1.503892],[1.123207,1.380781],[1.195509,1.25375],[1.26065,1.123115],[1.318507,0.989189],[1.368956,0.852287],[1.411872,0.712722],[1.447132,0.570808],[1.474611,0.426861],[1.534583,0.256431],[1.646678,0.121223],[1.798064,0.03212],[1.975908,0],[1.975908,-0.75]]);
	}
